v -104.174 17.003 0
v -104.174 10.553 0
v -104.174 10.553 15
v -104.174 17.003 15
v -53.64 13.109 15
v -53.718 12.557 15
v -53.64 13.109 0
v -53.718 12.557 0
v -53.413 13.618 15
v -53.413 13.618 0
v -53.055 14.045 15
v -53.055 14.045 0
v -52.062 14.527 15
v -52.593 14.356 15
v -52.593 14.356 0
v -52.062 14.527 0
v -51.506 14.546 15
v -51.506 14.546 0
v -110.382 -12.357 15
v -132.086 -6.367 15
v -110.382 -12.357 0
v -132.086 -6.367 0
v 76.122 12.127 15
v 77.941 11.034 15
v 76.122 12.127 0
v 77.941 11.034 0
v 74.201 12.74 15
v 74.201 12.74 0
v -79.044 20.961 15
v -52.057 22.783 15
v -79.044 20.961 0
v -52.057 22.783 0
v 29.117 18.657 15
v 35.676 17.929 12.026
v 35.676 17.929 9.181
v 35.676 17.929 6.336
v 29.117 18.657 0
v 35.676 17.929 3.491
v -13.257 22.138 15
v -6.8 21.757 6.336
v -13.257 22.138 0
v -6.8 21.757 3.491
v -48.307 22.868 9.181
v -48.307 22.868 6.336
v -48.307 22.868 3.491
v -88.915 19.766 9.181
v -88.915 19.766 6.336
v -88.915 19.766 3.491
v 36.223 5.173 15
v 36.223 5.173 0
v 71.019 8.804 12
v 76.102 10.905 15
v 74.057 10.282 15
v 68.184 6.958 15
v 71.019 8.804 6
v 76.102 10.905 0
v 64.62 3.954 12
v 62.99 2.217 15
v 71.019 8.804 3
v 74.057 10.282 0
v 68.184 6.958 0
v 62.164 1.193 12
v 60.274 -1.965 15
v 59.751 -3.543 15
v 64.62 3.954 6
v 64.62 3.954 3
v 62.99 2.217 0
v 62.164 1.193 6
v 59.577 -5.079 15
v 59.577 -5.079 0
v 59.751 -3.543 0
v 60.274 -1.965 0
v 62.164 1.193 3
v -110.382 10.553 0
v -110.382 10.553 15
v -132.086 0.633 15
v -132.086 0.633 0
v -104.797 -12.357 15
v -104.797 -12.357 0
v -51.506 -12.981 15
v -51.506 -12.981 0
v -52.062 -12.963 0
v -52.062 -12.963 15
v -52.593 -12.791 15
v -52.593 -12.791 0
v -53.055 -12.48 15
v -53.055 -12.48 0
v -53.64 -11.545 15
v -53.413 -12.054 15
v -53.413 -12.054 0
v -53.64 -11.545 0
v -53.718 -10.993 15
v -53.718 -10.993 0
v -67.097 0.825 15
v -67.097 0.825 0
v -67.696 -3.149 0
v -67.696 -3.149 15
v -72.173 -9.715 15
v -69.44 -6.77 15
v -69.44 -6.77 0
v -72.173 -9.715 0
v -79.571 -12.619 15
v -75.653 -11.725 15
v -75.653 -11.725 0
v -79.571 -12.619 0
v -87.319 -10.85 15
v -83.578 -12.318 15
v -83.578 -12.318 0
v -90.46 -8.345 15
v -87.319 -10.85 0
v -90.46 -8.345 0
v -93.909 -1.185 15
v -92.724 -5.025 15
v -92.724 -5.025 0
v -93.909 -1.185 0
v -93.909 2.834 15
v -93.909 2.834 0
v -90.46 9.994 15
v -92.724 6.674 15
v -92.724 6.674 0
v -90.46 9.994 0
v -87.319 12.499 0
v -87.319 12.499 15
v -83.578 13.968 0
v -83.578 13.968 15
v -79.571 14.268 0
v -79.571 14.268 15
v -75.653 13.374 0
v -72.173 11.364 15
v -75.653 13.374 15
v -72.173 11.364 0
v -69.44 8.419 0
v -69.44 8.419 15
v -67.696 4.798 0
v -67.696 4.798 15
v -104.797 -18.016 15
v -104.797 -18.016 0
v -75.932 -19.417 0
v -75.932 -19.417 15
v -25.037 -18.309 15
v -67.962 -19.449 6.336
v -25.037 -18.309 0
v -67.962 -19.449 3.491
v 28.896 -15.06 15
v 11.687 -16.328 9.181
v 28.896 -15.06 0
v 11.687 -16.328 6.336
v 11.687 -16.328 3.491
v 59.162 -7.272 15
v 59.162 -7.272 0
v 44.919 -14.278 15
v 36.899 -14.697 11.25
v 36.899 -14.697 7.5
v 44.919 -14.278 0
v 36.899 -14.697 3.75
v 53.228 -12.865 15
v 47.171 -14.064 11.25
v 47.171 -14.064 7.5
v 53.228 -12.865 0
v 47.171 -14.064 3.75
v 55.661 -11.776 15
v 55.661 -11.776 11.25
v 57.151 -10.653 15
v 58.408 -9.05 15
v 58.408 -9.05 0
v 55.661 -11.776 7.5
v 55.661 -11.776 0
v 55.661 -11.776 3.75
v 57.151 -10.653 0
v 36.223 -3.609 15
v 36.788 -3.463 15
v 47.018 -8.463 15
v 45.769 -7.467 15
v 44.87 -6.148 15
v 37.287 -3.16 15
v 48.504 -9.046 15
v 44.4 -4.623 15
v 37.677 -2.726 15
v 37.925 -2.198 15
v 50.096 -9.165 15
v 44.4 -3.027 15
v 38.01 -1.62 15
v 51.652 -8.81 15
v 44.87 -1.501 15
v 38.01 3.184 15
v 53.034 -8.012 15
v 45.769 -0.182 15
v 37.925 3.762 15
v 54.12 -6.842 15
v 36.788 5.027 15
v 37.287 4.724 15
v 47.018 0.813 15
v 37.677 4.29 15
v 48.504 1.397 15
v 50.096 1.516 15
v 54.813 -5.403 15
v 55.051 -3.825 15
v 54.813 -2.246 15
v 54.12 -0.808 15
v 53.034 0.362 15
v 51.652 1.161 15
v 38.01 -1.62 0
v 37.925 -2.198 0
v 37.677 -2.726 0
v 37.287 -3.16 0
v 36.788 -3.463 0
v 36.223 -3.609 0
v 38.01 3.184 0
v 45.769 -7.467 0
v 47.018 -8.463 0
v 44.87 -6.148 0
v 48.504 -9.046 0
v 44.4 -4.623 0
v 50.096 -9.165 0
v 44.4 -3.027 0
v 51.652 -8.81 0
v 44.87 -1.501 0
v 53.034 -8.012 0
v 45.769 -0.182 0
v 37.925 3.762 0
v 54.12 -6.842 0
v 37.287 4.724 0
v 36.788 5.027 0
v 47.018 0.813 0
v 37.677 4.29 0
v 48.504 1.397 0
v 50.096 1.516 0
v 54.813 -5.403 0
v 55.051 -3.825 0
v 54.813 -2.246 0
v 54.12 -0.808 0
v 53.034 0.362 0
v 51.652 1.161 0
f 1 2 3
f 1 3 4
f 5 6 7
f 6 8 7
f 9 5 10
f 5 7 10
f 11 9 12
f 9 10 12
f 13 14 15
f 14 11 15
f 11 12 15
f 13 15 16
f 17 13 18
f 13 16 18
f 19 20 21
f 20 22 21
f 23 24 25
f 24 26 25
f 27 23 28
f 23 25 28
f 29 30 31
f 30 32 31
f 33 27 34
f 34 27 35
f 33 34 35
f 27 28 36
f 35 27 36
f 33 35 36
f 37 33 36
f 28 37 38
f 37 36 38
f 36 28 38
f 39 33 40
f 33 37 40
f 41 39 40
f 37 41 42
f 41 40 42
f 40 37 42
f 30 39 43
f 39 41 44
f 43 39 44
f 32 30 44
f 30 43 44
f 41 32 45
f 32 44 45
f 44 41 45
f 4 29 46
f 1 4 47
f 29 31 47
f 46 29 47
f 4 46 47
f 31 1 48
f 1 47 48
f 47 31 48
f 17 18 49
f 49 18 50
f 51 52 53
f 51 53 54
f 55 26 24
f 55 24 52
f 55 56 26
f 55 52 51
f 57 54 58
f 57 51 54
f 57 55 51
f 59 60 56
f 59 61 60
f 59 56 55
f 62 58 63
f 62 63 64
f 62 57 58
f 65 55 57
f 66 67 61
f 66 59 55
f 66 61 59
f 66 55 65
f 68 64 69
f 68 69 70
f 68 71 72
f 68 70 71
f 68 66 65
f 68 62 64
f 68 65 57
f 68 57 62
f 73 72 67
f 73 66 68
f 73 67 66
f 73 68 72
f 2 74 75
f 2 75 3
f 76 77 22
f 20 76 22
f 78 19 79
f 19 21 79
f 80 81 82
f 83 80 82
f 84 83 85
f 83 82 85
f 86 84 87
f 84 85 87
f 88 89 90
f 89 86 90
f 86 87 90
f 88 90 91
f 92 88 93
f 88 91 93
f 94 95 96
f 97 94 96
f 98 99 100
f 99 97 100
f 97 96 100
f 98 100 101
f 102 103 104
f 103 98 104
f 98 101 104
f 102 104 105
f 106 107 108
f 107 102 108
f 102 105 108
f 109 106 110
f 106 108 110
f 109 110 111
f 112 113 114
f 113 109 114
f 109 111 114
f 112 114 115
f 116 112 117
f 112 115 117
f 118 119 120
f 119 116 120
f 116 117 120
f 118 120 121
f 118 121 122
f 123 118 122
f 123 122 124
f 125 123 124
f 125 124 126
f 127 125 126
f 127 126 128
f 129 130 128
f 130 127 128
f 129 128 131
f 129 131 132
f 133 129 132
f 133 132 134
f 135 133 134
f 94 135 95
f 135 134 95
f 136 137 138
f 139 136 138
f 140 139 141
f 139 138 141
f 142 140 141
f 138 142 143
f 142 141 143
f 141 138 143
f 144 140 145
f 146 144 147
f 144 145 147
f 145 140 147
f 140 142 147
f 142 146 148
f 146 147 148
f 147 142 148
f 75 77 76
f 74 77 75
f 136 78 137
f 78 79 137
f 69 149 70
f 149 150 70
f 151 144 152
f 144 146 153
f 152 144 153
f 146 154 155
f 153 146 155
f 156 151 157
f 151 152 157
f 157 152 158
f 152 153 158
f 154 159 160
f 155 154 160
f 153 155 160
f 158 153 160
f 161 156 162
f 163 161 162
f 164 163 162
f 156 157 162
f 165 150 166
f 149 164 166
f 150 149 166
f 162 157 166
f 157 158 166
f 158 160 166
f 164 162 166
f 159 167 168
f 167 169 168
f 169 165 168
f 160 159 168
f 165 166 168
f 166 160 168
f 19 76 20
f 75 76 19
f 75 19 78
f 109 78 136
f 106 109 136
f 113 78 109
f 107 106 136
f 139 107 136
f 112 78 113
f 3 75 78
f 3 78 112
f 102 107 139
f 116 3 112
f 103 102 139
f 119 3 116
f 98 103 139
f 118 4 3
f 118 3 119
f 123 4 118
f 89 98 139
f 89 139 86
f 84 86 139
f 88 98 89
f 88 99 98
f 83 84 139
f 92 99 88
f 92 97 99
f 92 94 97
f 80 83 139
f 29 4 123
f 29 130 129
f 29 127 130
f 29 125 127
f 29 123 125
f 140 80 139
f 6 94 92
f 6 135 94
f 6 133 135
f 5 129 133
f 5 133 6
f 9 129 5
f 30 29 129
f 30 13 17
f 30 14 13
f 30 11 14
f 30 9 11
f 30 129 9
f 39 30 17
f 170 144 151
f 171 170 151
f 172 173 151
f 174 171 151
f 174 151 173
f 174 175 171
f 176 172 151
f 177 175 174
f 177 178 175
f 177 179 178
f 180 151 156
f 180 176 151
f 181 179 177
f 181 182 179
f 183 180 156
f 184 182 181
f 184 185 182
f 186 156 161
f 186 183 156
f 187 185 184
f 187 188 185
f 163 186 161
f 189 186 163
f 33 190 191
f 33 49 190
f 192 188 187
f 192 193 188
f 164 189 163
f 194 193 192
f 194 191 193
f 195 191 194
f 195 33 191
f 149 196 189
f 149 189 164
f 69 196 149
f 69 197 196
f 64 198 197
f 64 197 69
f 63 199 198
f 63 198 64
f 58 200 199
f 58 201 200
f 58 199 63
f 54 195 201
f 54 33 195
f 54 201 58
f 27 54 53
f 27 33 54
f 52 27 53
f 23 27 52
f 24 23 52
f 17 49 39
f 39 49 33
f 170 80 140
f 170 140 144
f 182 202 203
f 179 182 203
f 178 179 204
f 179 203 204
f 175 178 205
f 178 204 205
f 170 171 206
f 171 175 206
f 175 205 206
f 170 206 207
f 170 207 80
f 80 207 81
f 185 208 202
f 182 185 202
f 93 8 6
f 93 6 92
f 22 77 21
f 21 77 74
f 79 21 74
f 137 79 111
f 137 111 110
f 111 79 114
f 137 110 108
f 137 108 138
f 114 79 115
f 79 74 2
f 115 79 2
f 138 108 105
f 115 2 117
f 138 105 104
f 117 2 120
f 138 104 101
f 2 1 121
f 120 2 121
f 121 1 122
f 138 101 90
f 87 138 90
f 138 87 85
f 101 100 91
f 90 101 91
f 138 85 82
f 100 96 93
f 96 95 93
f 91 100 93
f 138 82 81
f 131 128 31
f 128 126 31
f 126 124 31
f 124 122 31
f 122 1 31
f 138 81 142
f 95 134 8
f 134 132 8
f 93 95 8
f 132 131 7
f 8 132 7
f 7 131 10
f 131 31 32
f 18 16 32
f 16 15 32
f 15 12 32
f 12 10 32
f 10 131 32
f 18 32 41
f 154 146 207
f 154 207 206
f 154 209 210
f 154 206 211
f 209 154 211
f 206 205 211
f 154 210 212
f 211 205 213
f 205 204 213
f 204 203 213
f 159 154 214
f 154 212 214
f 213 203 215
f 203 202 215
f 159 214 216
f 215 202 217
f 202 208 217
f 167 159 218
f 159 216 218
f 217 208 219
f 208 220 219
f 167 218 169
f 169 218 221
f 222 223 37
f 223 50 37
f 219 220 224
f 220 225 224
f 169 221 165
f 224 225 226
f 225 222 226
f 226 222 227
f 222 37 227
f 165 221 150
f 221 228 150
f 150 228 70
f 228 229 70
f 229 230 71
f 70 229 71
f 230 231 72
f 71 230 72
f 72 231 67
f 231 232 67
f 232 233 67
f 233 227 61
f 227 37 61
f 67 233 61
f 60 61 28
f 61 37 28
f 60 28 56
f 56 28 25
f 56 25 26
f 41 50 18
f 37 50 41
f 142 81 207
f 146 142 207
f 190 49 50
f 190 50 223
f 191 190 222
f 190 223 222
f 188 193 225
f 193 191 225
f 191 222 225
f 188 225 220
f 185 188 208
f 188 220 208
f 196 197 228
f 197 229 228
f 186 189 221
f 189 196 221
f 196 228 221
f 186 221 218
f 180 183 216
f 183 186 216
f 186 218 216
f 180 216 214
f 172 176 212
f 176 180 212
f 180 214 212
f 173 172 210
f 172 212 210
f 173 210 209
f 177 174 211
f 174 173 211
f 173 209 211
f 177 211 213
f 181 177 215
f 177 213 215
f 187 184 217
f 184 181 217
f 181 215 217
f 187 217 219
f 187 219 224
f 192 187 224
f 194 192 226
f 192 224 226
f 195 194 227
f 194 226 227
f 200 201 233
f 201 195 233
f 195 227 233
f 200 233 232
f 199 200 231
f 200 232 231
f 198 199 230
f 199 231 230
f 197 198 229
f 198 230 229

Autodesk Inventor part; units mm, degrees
ref_plane "YZ Plane" through (0, 0, 0) normal (1, 0, 0) x (0, 1, 0)
ref_plane "XZ Plane" through (0, 0, 0) normal (0, 1, 0) x (-1, 0, 0)
ref_plane "XY Plane" through (0, 0, 0) normal (0, 0, 1) x (1, 0, 0)
sketch "Sketch3" plane through (0, 0, 0) normal (0, 0, 1) x (1, 0, 0)
  line L0 (-80.5781, 0.8246) -> (-80.5781, 20.7988) construction
  circle A0 centre (-80.5781, 0.8246) radius 13.481
  line L1 (-53.718, 12.5571) -> (-53.718, -10.9927)
  arc A1 (-53.718, -10.9927) -> (-51.5055, -12.9814) centre (-51.718, -10.9927) ccw
  arc A2 (-51.5055, 14.5458) -> (-53.718, 12.5571) centre (-51.718, 12.5571) ccw
  line L2 (36.2228, -3.6088) -> (-51.5055, -12.9814)
  line L3 (38.0103, 3.1845) -> (38.0103, -1.6201)
  line L4 (-80.5781, 0.8246) -> (49.5525, 0.8246) construction
  circle A3 centre (49.6953, -3.8247) radius 5.3555
  line L5 (59.6953, 14.884) -> (59.6953, -12.7998) construction
  spline S0 degree 4 poles (77.9414, 11.0338) (75.5683, 12.9654) (71.7145, 13.0272) (66.8099, 13.9036) (60.7685, 14.7338) (56.2959, 15.3578) (51.7728, 15.9509) (47.2242, 16.5426) (42.6244, 17.1111) (37.9974, 17.6651) (33.3378, 18.1987) (28.6546, 18.7114) (23.9504, 19.2026) (19.2309, 19.6699) (14.5002, 20.1135) (9.7632, 20.5291) (5.025, 20.9191) (0.2903, 21.2792) (-4.4372, 21.6095) (-9.151, 21.9092) (-13.8524, 22.1766) (-18.5268, 22.4102) (-23.2002, 22.6105) (-27.8558, 22.7627) (-32.4748, 22.8704) (-37.0553, 22.9312) (-41.5904, 22.9454) (-46.0738, 22.9127) (-50.5027, 22.8323) (-54.8678, 22.7052) (-59.1755, 22.5324) (-63.394, 22.3084) (-67.5752, 22.0492) (-71.5451, 21.7209) (-75.7777, 21.4072) (-79.04, 20.9063) (-83.4863, 20.5541) (-87.0067, 20.037) (-90.7113, 19.5168) (-94.2172, 18.9459) (-97.6363, 18.3426) (-100.9342, 17.7015) (-104.1216, 17.0263) (-107.1909, 16.3187) (-110.1396, 15.5797) (-112.9656, 14.8117) (-115.6652, 14.0172) (-118.2357, 13.1965) (-120.6759, 12.3541) (-122.9817, 11.4895) (-125.1529, 10.6071) (-127.1857, 9.7065) (-129.0794, 8.7914) (-130.8324, 7.8633) (-132.4429, 6.923) (-133.9096, 5.9737) (-135.2322, 5.016) (-136.4083, 4.0508) (-137.4392, 3.0816) (-138.3215, 2.1025) (-139.0592, 1.1321) (-139.6407, 0.1249) (-140.106, -0.8362) (-140.3589, -2.0477) (-140.602, -2.598) (-140.1166, -5.4607) (-140.0539, -5.4622) (-139.4639, -6.7645) (-138.8842, -7.4979) (-138.1173, -8.3934) (-137.2199, -9.1877) (-136.1721, -9.9852) (-134.9893, -10.738) (-133.6669, -11.4655) (-132.2091, -12.1599) (-130.6156, -12.8245) (-128.8897, -13.4579) (-127.0312, -14.0591) (-125.0439, -14.6296) (-122.9287, -15.1678) (-120.6879, -15.6738) (-118.3241, -16.1476) (-115.8396, -16.5892) (-113.2366, -16.9984) (-110.5176, -17.3742) (-107.6861, -17.7183) (-104.7439, -18.0297) (-101.6943, -18.3095) (-98.5398, -18.5568) (-95.2843, -18.7732) (-91.9297, -18.9579) (-88.48, -19.1131) (-84.9381, -19.2376) (-81.3071, -19.3341) (-77.5906, -19.4015) (-73.7915, -19.4421) (-69.9139, -19.4561) (-65.961, -19.445) (-61.9362, -19.4102) (-57.8434, -19.3518) (-53.6861, -19.2727) (-49.4679, -19.1731) (-45.1932, -19.0538) (-40.8649, -18.9183) (-36.4879, -18.766) (-32.0649, -18.5992) (-27.598, -18.4192) (-23.0941, -18.227) (-18.5434, -18.0273) (-13.9382, -17.8076) (-9.3141, -17.5719) (-4.666, -17.3195) (-0.0002, -17.052) (4.6675, -16.7728) (9.3655, -16.4759) (14.0236, -16.1832) (19.545, -15.7815) (23.3079, -15.6072) (27.1098, -15.1781) (28.8959, -15.0599) knots 0 0 0 0 0 0.024672 0.034555 0.0445 0.054495 0.064543 0.074632 0.084755 0.094911 0.105094 0.115299 0.125521 0.135755 0.145995 0.156237 0.166475 0.176705 0.186921 0.197118 0.207299 0.217463 0.227605 0.23772 0.247796 0.257824 0.267798 0.277713 0.287563 0.297345 0.307053 0.31668 0.326224 0.335555 0.344908 0.354162 0.363308 0.372467 0.381393 0.390196 0.398872 0.407415 0.41582 0.424082 0.432193 0.44015 0.447945 0.455574 0.46303 0.470307 0.477401 0.484305 0.491015 0.497525 0.503831 0.509931 0.515822 0.521506 0.526986 0.53227 0.537373 0.542316 0.547131 0.552525 0.557529 0.562533 0.567581 0.57205 0.576988 0.582082 0.587354 0.592817 0.598478 0.604341 0.610406 0.616671 0.623133 0.629789 0.636632 0.643658 0.650861 0.658236 0.665777 0.673478 0.681333 0.689338 0.697486 0.705771 0.71419 0.722736 0.731403 0.740188 0.749084 0.758087 0.767192 0.776393 0.785687 0.795067 0.804529 0.814069 0.823682 0.833362 0.843106 0.852907 0.862763 0.872667 0.88262 0.892624 0.902675 0.912766 0.92289 0.933033 0.943191 0.953358 0.963531 0.973703 0.984092 1 1 1 1 1
  line L6 (7.5013, -16.4763) -> (50.2906, -13.6435) construction
  arc A4 (44.8353, -17.2546) -> (13.385, -19.3367) centre (31.5327, -54.8885) ccw construction
  line L7 (159.6953, -3.8066) -> (59.6953, -3.8066) construction
  line L8 (-51.5055, 14.5458) -> (36.2228, 5.1732)
  arc A5 (36.2228, -3.6088) -> (38.0103, -1.6201) centre (36.0103, -1.6201) ccw
  arc A6 (38.0103, 3.1845) -> (36.2228, 5.1732) centre (36.0103, 3.1845) ccw
  spline S1 degree 4 poles (78.1029, 11.0141) (76.6463, 11.2227) (73.9909, 10.5042) (70.2765, 8.6041) (66.0429, 5.3938) (62.3889, 1.8499) (60.314, -1.2467) (59.5572, -3.5763) (59.5773, -5.0793) knots 0 0 0 0 0 0.302475 0.43895 0.576633 0.708802 1 1 1 1 1
  spline S2 degree 4 poles (28.8959, -15.0599) (34.0984, -14.7105) (49.269, -14.182) (58.5645, -15.239) (59.5773, -5.0793) knots 0 0 0 0 0 1 1 1 1 1
  line L9 (28.8959, -15.0599) -> (34.0984, -14.7105) construction
  line L10 (34.0984, -14.7105) -> (49.269, -14.182) construction
  line L11 (49.269, -14.182) -> (58.5645, -15.239) construction
  line L12 (58.5645, -15.239) -> (59.5773, -5.0793) construction
  line L13 (-140.4646, -2.8394) -> (159.4818, -3.8173) construction
  line L14 (-132.0856, 0.6333) -> (-132.0856, -6.3667)
  line L15 (-132.0856, -6.3667) -> (-110.3816, -12.3574)
  line L16 (-110.3816, -12.3574) -> (-104.797, -12.3574)
  line L17 (-104.797, -12.3574) -> (-104.797, -18.0156)
  line L18 (-132.0856, 0.6333) -> (-110.3816, 10.553)
  line L19 (-110.3816, 10.553) -> (-104.1736, 10.553)
  line L20 (-104.1736, 10.553) -> (-104.1736, 17.0026)
  point P0 (0, 0)
  point P1 (17.6589, 23.5628)
  point P2 (75.883, 10.8572)
  point P3 (72.8647, 9.7686)
  point P4 (69.4179, 7.8149)
  point P5 (66.0452, 5.2617)
  point P6 (63.1887, 2.4463)
  point P7 (61.1228, -0.3317)
  point P8 (59.9357, -2.8689)
  point P9 (-160.0931, -3.8671)
  point P10 (28.8959, -15.0599)
  point P11 (69.5533, 13.4647)
  point P12 (65.1899, 14.1023)
  point P13 (60.7936, 14.7318)
  point P14 (56.3207, 15.3468)
  point P15 (51.7945, 15.947)
  point P16 (47.2398, 16.5346)
  point P17 (42.6414, 17.1053)
  point P18 (38.0104, 17.6585)
  point P19 (33.3491, 18.1925)
  point P20 (28.6632, 18.7055)
  point P21 (23.9568, 19.1966)
  point P22 (19.2348, 19.6643)
  point P23 (14.5017, 20.1074)
  point P24 (9.7623, 20.5238)
  point P25 (5.0217, 20.9132)
  point P26 (0.2844, 21.2735)
  point P27 (-4.4451, 21.6038)
  point P28 (-9.1614, 21.9032)
  point P29 (-13.86, 22.1702)
  point P30 (-18.5361, 22.4036)
  point P31 (-23.211, 22.601)
  point P32 (-27.8721, 22.754)
  point P33 (-32.4966, 22.8611)
  point P34 (-37.0797, 22.9217)
  point P35 (-41.6169, 22.9356)
  point P36 (-46.1028, 22.9023)
  point P37 (-50.5329, 22.8216)
  point P38 (-54.9021, 22.6941)
  point P39 (-59.2065, 22.5195)
  point P40 (-63.4406, 22.2977)
  point P41 (-67.6008, 22.0302)
  point P42 (-71.6806, 21.7165)
  point P43 (-75.6814, 21.3591)
  point P44 (-79.1834, 20.9458)
  point P45 (-83.4048, 20.5095)
  point P46 (-87.1309, 20.023)
  point P47 (-90.7527, 19.494)
  point P48 (-94.2725, 18.9266)
  point P49 (-97.6845, 18.3211)
  point P50 (-100.9861, 17.6791)
  point P51 (-107.2438, 16.2934)
  point P52 (-110.1931, 15.553)
  point P53 (-113.0194, 14.7835)
  point P54 (-115.7191, 13.987)
  point P55 (-118.2898, 13.165)
  point P56 (-120.7294, 12.3201)
  point P57 (-123.0349, 11.454)
  point P58 (-125.2048, 10.569)
  point P59 (-127.2364, 9.6666)
  point P60 (-129.1282, 8.7491)
  point P61 (-130.8786, 7.8185)
  point P62 (-132.486, 6.8762)
  point P63 (-133.9488, 5.9245)
  point P64 (-135.2661, 4.9648)
  point P65 (-136.4363, 3.9987)
  point P66 (-137.4592, 3.0275)
  point P67 (-138.3336, 2.0531)
  point P68 (-139.0591, 1.0763)
  point P69 (-139.6352, 0.0983)
  point P70 (-140.0613, -0.8802)
  point P71 (-140.338, -1.8576)
  point P72 (-140.1239, -5.2398)
  point P73 (-139.9547, -5.7022)
  point P74 (-139.492, -6.6066)
  point P75 (-138.8844, -7.4823)
  point P76 (-138.1328, -8.3292)
  point P77 (-137.2384, -9.147)
  point P78 (-136.202, -9.9355)
  point P79 (-135.0249, -10.6943)
  point P80 (-133.7085, -11.4228)
  point P81 (-132.2548, -12.1206)
  point P82 (-130.6648, -12.7879)
  point P83 (-128.941, -13.4239)
  point P84 (-127.0846, -14.0282)
  point P85 (-125.0983, -14.6009)
  point P86 (-122.9839, -15.1415)
  point P87 (-120.7435, -15.6497)
  point P88 (-118.3798, -16.1256)
  point P89 (-115.8952, -16.569)
  point P90 (-113.2918, -16.9797)
  point P91 (-110.5723, -17.3574)
  point P92 (-107.74, -17.7027)
  point P93 (-101.7463, -18.2964)
  point P94 (-98.5909, -18.5451)
  point P95 (-95.3341, -18.7623)
  point P96 (-91.9783, -18.9484)
  point P97 (-88.5271, -19.1041)
  point P98 (-84.9838, -19.2298)
  point P99 (-81.3514, -19.3267)
  point P100 (-77.6332, -19.3951)
  point P101 (-73.8324, -19.4362)
  point P102 (-69.9531, -19.4509)
  point P103 (-65.9985, -19.4404)
  point P104 (-61.9719, -19.4059)
  point P105 (-57.8772, -19.3483)
  point P106 (-53.718, -19.2694)
  point P107 (-49.4979, -19.1701)
  point P108 (-45.2211, -19.0516)
  point P109 (-40.8909, -18.916)
  point P110 (-36.5118, -18.7642)
  point P111 (-32.0871, -18.5977)
  point P112 (-27.6213, -18.418)
  point P113 (-23.1183, -18.2269)
  point P114 (-18.5646, -18.0247)
  point P115 (-13.9566, -17.8054)
  point P116 (-9.3252, -17.5693)
  point P117 (-4.674, -17.317)
  point P118 (-0.0078, -17.05)
  point P119 (4.6686, -16.7695)
  point P120 (9.3513, -16.477)
  point P121 (14.0352, -16.1731)
  point P122 (18.7161, -15.8596)
  point P123 (23.3889, -15.5371)
  point P124 (78.0825, 12.164)
  point P125 (159.2574, -3.8401)
  point P126 (158.8836, -3.8779)
  point P127 (158.3607, -3.9307)
  point P128 (157.6896, -3.9985)
  point P129 (156.8706, -4.081)
  point P130 (155.9046, -4.1779)
  point P131 (154.7931, -4.2892)
  point P132 (153.5367, -4.4143)
  point P133 (152.1372, -4.5532)
  point P134 (150.5955, -4.7056)
  point P135 (148.914, -4.8712)
  point P136 (147.0936, -5.0494)
  point P137 (145.137, -5.2399)
  point P138 (143.0457, -5.4421)
  point P139 (140.8221, -5.6563)
  point P140 (138.4686, -5.8813)
  point P141 (135.9876, -6.1174)
  point P142 (133.3815, -6.3634)
  point P143 (130.6533, -6.6196)
  point P144 (127.8054, -6.8851)
  point P145 (124.8414, -7.1596)
  point P146 (121.7634, -7.4428)
  point P147 (118.5756, -7.7341)
  point P148 (115.2804, -8.0332)
  point P149 (111.8817, -8.3395)
  point P150 (108.3828, -8.6527)
  point P151 (104.787, -8.9722)
  point P152 (101.0985, -9.2974)
  point P153 (97.3206, -9.6283)
  point P154 (93.4572, -9.9643)
  point P155 (89.5122, -10.3048)
  point P156 (85.4898, -10.6492)
  point P157 (81.3936, -10.9969)
  point P158 (77.2284, -11.3479)
  point P159 (72.9975, -11.701)
  point P160 (68.7057, -12.0556)
  point P161 (64.3572, -12.4117)
  point P162 (59.9559, -12.7678)
  point P163 (55.5069, -13.1239)
  point P164 (51.0138, -13.4788)
  point P165 (46.4817, -13.8316)
  point P166 (41.9148, -14.182)
  point P167 (35.7035, -14.3277)
  point P168 (32.6946, -14.8708)
  point P169 (82.2459, 11.5043)
  point P170 (86.3364, 10.8401)
  point P171 (90.3495, 10.1732)
  point P172 (94.2816, 9.5051)
  point P173 (98.1288, 8.837)
  point P174 (101.8872, 8.171)
  point P175 (105.5538, 7.5086)
  point P176 (109.1244, 6.8507)
  point P177 (112.596, 6.1997)
  point P178 (115.9653, 5.5565)
  point P179 (119.2287, 4.9229)
  point P180 (122.3835, 4.3007)
  point P181 (125.4264, 3.6911)
  point P182 (128.3547, 3.0956)
  point P183 (131.1654, 2.5157)
  point P184 (133.8561, 1.9532)
  point P185 (136.4244, 1.4093)
  point P186 (138.8676, 0.8855)
  point P187 (141.1833, 0.383)
  point P188 (143.3697, -0.0964)
  point P189 (145.4247, -0.5518)
  point P190 (147.3462, -0.9817)
  point P191 (149.1327, -1.3852)
  point P192 (150.7821, -1.7608)
  point P193 (152.2935, -2.1073)
  point P194 (153.6651, -2.4241)
  point P195 (154.8954, -2.7103)
  point P196 (155.9838, -2.9647)
  point P197 (156.9291, -3.187)
  point P198 (157.7307, -3.376)
  point P199 (158.3871, -3.5317)
  dimension "d3" = 26.962
  dimension "d6" = 10.711
  dimension "d7" = 110
  dimension "d8" = 100
  dimension "d9" = 2
  dimension "d11" = 4.6493
  dimension "d25" = 7
  dimension "d26" = 3.5
  dimension "d27" = 8.379
  dimension "d28" = 30.083
  dimension "d29" = 5
  dimension "d30" = 5
  dimension "d31" = 59.8865
extrude "Extrusion2" add sketch "Sketch3" along normal blind 15 contours S1 S2 S0 L17 L16 L15 L14 L18 L19 L20
properties part number "3P.03.10.02.JS.rib 10 foam_CPY"
